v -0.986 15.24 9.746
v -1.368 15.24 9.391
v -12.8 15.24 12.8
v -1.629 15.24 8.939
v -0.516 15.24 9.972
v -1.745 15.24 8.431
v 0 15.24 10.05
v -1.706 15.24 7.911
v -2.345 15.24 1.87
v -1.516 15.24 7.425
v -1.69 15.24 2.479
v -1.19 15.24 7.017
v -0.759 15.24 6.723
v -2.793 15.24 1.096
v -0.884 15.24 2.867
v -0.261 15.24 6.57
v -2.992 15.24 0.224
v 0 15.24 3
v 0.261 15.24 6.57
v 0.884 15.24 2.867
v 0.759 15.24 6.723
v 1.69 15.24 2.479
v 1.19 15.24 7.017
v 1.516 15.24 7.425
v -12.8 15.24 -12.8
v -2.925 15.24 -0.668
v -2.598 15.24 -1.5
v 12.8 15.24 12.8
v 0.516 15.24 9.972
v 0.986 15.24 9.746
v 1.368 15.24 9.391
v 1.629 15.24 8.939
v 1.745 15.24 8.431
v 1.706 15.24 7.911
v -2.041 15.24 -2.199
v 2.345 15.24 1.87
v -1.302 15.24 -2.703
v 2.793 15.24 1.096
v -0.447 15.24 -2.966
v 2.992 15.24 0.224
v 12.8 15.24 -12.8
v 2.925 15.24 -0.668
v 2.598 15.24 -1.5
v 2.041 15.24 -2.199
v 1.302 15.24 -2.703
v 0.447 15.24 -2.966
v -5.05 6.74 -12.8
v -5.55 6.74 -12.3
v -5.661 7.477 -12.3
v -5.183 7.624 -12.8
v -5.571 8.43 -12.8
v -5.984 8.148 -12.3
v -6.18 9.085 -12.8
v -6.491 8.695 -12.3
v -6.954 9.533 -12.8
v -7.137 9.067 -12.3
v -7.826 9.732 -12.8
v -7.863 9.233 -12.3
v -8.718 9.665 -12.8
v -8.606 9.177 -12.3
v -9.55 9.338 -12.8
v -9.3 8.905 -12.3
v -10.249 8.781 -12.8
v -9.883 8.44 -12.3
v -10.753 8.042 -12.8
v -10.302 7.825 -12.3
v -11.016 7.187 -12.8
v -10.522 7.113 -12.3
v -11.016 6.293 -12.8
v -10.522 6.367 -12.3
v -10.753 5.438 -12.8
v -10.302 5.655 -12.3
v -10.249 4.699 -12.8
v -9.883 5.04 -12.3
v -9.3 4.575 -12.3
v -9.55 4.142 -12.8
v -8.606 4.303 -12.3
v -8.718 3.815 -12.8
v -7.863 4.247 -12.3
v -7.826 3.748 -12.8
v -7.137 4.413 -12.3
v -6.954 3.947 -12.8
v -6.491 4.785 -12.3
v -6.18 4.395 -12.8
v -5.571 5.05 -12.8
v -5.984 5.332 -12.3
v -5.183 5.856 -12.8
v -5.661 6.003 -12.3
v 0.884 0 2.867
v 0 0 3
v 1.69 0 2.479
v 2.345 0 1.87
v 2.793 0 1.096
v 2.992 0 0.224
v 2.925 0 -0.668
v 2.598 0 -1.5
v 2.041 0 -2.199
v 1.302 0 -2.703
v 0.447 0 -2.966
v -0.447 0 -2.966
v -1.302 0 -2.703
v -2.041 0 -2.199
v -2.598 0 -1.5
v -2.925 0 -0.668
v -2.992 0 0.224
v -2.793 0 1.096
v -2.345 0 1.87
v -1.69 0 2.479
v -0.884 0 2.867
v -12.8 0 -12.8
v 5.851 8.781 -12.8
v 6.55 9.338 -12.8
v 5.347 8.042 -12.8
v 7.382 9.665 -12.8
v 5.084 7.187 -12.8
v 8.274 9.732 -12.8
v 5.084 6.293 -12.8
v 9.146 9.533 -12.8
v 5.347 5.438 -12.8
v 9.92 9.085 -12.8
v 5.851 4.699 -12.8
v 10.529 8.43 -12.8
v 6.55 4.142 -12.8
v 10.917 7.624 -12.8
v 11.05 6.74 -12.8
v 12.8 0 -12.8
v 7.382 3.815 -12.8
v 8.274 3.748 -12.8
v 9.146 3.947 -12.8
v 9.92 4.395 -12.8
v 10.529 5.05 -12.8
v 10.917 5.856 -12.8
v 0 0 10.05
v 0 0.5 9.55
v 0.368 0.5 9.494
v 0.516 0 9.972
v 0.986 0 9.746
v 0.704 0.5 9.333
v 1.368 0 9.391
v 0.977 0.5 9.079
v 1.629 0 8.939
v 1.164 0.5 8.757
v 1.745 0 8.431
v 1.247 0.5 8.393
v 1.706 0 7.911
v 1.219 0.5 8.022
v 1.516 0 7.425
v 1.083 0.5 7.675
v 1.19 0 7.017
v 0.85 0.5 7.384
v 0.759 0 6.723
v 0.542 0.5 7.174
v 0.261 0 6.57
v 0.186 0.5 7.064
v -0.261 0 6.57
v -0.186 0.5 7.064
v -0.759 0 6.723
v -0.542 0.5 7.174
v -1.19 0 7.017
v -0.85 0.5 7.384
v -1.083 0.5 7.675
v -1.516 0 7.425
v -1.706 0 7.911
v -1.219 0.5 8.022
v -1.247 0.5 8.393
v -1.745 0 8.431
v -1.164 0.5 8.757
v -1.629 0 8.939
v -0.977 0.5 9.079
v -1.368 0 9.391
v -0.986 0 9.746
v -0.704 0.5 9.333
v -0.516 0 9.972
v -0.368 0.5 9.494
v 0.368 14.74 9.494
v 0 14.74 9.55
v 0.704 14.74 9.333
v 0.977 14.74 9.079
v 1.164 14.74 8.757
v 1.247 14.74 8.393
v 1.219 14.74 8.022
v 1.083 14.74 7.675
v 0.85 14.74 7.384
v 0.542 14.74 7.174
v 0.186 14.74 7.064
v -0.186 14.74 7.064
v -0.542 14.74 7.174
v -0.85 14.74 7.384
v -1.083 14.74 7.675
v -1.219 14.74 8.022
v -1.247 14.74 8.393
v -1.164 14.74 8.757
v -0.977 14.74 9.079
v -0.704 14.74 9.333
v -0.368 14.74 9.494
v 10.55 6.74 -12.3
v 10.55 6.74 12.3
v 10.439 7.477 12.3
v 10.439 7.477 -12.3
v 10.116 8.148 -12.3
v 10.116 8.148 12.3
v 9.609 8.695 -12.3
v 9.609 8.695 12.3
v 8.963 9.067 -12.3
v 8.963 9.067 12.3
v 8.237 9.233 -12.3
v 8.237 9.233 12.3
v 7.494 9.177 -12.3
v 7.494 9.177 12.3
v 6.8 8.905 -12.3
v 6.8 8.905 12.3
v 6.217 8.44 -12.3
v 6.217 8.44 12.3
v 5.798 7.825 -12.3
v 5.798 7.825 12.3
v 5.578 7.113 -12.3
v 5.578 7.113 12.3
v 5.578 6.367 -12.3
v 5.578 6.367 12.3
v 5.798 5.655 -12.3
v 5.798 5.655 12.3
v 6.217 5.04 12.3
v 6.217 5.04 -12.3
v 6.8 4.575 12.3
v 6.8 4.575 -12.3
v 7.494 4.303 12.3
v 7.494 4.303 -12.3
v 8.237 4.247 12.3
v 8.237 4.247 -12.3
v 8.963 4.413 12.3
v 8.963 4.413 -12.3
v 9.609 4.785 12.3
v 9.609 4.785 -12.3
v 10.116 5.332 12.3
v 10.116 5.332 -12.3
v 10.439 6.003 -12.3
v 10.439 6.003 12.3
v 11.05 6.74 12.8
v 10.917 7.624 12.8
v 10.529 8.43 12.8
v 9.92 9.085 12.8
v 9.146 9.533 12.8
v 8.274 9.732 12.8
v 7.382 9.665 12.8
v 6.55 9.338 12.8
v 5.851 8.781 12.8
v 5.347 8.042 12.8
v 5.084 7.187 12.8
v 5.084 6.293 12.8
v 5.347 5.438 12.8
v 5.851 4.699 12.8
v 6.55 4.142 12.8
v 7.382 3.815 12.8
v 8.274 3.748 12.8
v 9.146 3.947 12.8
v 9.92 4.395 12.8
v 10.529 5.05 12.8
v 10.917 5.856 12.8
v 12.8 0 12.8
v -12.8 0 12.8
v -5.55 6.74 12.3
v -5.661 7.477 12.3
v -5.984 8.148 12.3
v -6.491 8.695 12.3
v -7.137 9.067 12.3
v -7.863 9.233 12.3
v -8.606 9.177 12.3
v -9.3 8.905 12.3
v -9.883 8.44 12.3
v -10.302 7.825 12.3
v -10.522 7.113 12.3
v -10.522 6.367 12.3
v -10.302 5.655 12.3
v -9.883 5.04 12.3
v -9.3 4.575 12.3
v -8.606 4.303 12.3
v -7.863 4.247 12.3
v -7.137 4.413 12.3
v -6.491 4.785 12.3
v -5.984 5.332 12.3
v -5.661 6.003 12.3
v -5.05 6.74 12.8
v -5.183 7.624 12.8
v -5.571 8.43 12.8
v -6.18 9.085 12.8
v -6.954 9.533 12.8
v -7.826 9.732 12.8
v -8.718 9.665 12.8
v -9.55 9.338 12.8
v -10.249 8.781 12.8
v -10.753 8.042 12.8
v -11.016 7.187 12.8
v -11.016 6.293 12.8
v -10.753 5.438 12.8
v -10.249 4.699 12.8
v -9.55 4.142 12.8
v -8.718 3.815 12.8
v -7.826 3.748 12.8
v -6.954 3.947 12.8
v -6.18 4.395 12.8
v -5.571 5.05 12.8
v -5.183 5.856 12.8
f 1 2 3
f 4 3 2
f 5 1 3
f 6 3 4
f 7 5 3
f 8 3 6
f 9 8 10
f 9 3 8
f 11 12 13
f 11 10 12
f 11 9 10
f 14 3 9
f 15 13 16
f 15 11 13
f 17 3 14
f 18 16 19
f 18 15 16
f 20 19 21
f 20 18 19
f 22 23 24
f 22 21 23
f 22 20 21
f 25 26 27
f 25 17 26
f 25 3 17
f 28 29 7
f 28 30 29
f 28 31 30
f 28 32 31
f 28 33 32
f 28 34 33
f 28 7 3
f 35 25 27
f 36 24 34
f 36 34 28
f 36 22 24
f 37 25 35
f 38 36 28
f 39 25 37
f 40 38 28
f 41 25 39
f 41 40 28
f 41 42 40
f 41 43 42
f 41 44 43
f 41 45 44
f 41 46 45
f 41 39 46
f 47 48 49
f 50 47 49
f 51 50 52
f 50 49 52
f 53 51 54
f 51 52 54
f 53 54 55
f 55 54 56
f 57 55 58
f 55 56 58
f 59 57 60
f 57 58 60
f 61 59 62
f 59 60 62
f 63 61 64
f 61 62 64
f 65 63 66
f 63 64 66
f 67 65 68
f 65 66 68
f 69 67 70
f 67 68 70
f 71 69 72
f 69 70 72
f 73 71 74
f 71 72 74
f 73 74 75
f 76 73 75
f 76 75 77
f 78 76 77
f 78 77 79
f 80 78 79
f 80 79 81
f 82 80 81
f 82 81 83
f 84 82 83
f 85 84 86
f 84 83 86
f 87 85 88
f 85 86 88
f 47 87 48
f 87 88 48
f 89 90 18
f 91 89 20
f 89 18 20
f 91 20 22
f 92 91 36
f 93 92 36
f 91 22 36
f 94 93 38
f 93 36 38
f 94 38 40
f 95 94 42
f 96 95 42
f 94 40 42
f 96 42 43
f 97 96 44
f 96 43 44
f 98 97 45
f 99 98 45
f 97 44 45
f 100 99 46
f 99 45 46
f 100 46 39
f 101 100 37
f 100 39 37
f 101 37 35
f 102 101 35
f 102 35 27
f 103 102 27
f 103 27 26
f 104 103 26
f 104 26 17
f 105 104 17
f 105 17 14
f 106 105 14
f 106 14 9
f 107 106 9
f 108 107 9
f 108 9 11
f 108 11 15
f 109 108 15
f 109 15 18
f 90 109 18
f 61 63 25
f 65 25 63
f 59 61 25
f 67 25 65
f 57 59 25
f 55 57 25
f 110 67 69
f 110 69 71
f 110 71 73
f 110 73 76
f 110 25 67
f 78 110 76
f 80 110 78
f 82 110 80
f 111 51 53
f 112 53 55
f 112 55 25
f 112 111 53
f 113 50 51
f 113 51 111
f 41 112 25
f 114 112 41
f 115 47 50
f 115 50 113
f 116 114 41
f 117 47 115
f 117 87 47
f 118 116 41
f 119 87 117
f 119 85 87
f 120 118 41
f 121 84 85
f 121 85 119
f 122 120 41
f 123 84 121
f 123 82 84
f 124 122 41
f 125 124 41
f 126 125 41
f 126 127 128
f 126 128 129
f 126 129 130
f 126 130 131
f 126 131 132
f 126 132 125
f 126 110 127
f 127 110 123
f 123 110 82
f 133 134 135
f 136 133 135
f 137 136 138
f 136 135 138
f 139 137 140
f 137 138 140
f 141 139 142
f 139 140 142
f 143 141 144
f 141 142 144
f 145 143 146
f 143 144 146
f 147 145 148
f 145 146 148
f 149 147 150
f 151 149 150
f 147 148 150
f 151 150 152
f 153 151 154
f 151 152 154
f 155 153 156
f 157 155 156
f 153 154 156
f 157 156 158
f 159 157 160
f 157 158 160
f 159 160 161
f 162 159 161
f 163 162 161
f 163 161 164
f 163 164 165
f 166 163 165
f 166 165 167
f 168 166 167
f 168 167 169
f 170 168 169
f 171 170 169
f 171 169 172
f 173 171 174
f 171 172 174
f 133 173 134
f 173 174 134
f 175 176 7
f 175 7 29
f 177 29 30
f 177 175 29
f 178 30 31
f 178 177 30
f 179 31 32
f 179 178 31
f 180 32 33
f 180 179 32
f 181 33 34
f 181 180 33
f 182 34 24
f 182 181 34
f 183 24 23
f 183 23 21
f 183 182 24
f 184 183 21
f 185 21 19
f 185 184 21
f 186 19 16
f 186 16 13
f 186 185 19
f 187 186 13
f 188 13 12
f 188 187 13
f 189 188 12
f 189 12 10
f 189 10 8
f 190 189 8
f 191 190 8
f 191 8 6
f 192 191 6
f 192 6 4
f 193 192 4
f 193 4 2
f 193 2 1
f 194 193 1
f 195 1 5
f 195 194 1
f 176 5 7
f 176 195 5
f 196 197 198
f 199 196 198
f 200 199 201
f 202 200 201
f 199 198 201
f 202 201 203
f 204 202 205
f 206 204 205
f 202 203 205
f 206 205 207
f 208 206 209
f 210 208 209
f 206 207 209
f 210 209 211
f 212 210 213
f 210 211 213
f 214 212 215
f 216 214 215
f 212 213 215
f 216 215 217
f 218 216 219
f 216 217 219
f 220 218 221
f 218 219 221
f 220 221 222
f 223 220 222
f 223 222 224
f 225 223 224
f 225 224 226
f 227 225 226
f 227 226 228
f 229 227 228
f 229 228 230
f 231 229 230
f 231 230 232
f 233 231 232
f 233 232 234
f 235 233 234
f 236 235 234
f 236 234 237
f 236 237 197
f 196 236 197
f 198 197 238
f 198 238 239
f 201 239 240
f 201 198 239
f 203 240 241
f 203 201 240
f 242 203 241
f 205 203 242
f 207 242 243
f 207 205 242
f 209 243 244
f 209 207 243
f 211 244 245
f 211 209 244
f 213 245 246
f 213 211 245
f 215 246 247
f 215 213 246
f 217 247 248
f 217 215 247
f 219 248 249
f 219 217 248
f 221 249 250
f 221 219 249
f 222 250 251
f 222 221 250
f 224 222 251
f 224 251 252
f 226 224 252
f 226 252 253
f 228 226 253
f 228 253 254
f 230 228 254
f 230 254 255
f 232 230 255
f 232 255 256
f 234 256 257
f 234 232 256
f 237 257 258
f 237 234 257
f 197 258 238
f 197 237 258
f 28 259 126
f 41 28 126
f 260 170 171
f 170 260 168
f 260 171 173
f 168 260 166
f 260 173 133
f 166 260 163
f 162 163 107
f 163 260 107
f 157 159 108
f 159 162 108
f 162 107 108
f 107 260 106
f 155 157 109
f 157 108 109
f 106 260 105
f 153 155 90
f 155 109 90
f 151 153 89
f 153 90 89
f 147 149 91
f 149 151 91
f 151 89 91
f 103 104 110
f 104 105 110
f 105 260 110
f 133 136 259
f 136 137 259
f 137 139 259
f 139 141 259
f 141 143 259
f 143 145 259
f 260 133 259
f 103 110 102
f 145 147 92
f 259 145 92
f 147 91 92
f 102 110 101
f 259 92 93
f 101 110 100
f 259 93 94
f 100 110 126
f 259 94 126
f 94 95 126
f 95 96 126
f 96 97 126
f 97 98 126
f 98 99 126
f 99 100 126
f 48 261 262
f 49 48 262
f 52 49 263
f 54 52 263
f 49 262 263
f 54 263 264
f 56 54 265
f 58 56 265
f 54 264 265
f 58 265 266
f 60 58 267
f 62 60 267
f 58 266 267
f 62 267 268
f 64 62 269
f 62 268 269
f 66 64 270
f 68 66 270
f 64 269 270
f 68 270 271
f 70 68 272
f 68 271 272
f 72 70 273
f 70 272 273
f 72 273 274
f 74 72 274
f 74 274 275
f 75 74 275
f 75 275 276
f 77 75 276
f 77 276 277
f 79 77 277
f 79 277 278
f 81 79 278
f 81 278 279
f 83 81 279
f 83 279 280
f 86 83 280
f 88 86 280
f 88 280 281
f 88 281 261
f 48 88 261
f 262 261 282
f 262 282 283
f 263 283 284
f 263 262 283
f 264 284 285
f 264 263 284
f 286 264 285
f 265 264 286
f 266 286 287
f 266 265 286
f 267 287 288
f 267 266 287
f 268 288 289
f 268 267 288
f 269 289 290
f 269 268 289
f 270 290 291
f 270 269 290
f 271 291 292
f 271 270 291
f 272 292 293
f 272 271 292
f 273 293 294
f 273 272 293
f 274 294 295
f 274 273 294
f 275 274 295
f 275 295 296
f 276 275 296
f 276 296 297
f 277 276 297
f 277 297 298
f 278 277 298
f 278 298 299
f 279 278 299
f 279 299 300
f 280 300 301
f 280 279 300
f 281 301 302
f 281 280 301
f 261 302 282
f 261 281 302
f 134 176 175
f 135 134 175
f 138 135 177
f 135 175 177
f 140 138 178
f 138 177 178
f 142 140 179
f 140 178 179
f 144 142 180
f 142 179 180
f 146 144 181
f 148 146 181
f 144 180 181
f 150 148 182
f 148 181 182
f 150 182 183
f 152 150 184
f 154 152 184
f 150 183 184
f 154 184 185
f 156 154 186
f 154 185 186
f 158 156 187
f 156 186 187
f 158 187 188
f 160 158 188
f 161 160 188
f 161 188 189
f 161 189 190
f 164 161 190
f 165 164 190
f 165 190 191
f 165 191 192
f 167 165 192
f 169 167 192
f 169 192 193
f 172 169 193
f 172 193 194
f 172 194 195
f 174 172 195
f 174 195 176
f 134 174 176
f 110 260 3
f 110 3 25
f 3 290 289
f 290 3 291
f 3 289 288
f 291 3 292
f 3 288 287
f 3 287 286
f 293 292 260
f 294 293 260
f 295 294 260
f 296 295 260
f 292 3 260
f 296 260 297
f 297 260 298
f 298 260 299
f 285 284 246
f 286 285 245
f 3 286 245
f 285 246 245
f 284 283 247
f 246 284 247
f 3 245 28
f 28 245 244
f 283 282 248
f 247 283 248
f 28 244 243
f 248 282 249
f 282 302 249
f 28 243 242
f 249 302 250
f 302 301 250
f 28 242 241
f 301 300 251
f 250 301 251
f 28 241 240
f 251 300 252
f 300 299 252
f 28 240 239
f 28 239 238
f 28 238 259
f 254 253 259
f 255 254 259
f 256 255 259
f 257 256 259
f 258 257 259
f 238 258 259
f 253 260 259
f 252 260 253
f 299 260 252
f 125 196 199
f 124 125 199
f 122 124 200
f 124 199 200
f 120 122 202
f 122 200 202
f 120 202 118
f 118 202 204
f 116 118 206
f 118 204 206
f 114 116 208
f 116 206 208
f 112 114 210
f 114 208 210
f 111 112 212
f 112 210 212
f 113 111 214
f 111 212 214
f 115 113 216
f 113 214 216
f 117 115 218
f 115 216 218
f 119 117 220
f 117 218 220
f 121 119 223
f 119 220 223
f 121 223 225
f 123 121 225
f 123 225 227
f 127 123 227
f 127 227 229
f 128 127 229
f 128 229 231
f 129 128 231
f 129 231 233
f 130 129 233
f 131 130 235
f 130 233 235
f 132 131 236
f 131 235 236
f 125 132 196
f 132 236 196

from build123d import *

# Parameters (mm, degrees)
SKETCH1_W           = 25.6
SKETCH1_H           = 25.6
BOSS_EXTRUDE1_DEPTH = 15.24
SKETCH2_R           = 2.5
CUT_EXTRUDE1_DEPTH  = 33.426186948
SKETCH3_R           = 1.25
CUT_EXTRUDE2_DEPTH  = 24.663000655
CHAMFER1_SIZE       = 0.5
SKETCH7_R           = 3
CUT_EXTRUDE3_DEPTH  = 24.663000655


with BuildPart() as part:
    # Sketch1 → Boss-Extrude1 (new body)
    with BuildSketch(Plane(origin=(0, 0, 0), x_dir=(1, 0, 0), z_dir=(0, 1, 0))):
        Rectangle(SKETCH1_W, SKETCH1_H)
    extrude(amount=BOSS_EXTRUDE1_DEPTH)

    # Sketch2 → Cut-Extrude1 (cut, through all)
    with BuildSketch(Plane.XY.offset(12.8)):
        with Locations((-8.05, 6.74)):
            Circle(SKETCH2_R)
        with Locations((8.05, 6.74)):
            Circle(SKETCH2_R)
    extrude(amount=-CUT_EXTRUDE1_DEPTH, mode=Mode.SUBTRACT)

    # Sketch3 → Cut-Extrude2 (cut, through all)
    with BuildSketch(Plane(origin=(0, 15.24, 0), x_dir=(1, 0, 0), z_dir=(0, 1, 0))):
        with Locations(Location((0, -8.3, 0), (0, 0, 270))):
            Circle(SKETCH3_R)
    extrude(amount=-CUT_EXTRUDE2_DEPTH, mode=Mode.SUBTRACT)

    # Chamfer1
    chamfer1_edges = [part.edges().sort_by_distance(p)[0] for p in [
        (-10.55, 6.74, -12.8),
        (-10.55, 6.74, 12.8),
        (5.55, 6.74, -12.8),
        (5.55, 6.74, 12.8),
        (0, 0, 7.05),
        (0, 15.24, 7.05),
    ]]
    chamfer(chamfer1_edges, length=CHAMFER1_SIZE)

    # Sketch7 → Cut-Extrude3 (cut, through all)
    with BuildSketch(Plane(origin=(0, 15.24, 0), x_dir=(1, 0, 0), z_dir=(0, 1, 0))):
        with Locations(Location((0, 0, 0), (0, 0, 270))):
            Circle(SKETCH7_R)
    extrude(amount=-CUT_EXTRUDE3_DEPTH, mode=Mode.SUBTRACT)


solid = part.part
